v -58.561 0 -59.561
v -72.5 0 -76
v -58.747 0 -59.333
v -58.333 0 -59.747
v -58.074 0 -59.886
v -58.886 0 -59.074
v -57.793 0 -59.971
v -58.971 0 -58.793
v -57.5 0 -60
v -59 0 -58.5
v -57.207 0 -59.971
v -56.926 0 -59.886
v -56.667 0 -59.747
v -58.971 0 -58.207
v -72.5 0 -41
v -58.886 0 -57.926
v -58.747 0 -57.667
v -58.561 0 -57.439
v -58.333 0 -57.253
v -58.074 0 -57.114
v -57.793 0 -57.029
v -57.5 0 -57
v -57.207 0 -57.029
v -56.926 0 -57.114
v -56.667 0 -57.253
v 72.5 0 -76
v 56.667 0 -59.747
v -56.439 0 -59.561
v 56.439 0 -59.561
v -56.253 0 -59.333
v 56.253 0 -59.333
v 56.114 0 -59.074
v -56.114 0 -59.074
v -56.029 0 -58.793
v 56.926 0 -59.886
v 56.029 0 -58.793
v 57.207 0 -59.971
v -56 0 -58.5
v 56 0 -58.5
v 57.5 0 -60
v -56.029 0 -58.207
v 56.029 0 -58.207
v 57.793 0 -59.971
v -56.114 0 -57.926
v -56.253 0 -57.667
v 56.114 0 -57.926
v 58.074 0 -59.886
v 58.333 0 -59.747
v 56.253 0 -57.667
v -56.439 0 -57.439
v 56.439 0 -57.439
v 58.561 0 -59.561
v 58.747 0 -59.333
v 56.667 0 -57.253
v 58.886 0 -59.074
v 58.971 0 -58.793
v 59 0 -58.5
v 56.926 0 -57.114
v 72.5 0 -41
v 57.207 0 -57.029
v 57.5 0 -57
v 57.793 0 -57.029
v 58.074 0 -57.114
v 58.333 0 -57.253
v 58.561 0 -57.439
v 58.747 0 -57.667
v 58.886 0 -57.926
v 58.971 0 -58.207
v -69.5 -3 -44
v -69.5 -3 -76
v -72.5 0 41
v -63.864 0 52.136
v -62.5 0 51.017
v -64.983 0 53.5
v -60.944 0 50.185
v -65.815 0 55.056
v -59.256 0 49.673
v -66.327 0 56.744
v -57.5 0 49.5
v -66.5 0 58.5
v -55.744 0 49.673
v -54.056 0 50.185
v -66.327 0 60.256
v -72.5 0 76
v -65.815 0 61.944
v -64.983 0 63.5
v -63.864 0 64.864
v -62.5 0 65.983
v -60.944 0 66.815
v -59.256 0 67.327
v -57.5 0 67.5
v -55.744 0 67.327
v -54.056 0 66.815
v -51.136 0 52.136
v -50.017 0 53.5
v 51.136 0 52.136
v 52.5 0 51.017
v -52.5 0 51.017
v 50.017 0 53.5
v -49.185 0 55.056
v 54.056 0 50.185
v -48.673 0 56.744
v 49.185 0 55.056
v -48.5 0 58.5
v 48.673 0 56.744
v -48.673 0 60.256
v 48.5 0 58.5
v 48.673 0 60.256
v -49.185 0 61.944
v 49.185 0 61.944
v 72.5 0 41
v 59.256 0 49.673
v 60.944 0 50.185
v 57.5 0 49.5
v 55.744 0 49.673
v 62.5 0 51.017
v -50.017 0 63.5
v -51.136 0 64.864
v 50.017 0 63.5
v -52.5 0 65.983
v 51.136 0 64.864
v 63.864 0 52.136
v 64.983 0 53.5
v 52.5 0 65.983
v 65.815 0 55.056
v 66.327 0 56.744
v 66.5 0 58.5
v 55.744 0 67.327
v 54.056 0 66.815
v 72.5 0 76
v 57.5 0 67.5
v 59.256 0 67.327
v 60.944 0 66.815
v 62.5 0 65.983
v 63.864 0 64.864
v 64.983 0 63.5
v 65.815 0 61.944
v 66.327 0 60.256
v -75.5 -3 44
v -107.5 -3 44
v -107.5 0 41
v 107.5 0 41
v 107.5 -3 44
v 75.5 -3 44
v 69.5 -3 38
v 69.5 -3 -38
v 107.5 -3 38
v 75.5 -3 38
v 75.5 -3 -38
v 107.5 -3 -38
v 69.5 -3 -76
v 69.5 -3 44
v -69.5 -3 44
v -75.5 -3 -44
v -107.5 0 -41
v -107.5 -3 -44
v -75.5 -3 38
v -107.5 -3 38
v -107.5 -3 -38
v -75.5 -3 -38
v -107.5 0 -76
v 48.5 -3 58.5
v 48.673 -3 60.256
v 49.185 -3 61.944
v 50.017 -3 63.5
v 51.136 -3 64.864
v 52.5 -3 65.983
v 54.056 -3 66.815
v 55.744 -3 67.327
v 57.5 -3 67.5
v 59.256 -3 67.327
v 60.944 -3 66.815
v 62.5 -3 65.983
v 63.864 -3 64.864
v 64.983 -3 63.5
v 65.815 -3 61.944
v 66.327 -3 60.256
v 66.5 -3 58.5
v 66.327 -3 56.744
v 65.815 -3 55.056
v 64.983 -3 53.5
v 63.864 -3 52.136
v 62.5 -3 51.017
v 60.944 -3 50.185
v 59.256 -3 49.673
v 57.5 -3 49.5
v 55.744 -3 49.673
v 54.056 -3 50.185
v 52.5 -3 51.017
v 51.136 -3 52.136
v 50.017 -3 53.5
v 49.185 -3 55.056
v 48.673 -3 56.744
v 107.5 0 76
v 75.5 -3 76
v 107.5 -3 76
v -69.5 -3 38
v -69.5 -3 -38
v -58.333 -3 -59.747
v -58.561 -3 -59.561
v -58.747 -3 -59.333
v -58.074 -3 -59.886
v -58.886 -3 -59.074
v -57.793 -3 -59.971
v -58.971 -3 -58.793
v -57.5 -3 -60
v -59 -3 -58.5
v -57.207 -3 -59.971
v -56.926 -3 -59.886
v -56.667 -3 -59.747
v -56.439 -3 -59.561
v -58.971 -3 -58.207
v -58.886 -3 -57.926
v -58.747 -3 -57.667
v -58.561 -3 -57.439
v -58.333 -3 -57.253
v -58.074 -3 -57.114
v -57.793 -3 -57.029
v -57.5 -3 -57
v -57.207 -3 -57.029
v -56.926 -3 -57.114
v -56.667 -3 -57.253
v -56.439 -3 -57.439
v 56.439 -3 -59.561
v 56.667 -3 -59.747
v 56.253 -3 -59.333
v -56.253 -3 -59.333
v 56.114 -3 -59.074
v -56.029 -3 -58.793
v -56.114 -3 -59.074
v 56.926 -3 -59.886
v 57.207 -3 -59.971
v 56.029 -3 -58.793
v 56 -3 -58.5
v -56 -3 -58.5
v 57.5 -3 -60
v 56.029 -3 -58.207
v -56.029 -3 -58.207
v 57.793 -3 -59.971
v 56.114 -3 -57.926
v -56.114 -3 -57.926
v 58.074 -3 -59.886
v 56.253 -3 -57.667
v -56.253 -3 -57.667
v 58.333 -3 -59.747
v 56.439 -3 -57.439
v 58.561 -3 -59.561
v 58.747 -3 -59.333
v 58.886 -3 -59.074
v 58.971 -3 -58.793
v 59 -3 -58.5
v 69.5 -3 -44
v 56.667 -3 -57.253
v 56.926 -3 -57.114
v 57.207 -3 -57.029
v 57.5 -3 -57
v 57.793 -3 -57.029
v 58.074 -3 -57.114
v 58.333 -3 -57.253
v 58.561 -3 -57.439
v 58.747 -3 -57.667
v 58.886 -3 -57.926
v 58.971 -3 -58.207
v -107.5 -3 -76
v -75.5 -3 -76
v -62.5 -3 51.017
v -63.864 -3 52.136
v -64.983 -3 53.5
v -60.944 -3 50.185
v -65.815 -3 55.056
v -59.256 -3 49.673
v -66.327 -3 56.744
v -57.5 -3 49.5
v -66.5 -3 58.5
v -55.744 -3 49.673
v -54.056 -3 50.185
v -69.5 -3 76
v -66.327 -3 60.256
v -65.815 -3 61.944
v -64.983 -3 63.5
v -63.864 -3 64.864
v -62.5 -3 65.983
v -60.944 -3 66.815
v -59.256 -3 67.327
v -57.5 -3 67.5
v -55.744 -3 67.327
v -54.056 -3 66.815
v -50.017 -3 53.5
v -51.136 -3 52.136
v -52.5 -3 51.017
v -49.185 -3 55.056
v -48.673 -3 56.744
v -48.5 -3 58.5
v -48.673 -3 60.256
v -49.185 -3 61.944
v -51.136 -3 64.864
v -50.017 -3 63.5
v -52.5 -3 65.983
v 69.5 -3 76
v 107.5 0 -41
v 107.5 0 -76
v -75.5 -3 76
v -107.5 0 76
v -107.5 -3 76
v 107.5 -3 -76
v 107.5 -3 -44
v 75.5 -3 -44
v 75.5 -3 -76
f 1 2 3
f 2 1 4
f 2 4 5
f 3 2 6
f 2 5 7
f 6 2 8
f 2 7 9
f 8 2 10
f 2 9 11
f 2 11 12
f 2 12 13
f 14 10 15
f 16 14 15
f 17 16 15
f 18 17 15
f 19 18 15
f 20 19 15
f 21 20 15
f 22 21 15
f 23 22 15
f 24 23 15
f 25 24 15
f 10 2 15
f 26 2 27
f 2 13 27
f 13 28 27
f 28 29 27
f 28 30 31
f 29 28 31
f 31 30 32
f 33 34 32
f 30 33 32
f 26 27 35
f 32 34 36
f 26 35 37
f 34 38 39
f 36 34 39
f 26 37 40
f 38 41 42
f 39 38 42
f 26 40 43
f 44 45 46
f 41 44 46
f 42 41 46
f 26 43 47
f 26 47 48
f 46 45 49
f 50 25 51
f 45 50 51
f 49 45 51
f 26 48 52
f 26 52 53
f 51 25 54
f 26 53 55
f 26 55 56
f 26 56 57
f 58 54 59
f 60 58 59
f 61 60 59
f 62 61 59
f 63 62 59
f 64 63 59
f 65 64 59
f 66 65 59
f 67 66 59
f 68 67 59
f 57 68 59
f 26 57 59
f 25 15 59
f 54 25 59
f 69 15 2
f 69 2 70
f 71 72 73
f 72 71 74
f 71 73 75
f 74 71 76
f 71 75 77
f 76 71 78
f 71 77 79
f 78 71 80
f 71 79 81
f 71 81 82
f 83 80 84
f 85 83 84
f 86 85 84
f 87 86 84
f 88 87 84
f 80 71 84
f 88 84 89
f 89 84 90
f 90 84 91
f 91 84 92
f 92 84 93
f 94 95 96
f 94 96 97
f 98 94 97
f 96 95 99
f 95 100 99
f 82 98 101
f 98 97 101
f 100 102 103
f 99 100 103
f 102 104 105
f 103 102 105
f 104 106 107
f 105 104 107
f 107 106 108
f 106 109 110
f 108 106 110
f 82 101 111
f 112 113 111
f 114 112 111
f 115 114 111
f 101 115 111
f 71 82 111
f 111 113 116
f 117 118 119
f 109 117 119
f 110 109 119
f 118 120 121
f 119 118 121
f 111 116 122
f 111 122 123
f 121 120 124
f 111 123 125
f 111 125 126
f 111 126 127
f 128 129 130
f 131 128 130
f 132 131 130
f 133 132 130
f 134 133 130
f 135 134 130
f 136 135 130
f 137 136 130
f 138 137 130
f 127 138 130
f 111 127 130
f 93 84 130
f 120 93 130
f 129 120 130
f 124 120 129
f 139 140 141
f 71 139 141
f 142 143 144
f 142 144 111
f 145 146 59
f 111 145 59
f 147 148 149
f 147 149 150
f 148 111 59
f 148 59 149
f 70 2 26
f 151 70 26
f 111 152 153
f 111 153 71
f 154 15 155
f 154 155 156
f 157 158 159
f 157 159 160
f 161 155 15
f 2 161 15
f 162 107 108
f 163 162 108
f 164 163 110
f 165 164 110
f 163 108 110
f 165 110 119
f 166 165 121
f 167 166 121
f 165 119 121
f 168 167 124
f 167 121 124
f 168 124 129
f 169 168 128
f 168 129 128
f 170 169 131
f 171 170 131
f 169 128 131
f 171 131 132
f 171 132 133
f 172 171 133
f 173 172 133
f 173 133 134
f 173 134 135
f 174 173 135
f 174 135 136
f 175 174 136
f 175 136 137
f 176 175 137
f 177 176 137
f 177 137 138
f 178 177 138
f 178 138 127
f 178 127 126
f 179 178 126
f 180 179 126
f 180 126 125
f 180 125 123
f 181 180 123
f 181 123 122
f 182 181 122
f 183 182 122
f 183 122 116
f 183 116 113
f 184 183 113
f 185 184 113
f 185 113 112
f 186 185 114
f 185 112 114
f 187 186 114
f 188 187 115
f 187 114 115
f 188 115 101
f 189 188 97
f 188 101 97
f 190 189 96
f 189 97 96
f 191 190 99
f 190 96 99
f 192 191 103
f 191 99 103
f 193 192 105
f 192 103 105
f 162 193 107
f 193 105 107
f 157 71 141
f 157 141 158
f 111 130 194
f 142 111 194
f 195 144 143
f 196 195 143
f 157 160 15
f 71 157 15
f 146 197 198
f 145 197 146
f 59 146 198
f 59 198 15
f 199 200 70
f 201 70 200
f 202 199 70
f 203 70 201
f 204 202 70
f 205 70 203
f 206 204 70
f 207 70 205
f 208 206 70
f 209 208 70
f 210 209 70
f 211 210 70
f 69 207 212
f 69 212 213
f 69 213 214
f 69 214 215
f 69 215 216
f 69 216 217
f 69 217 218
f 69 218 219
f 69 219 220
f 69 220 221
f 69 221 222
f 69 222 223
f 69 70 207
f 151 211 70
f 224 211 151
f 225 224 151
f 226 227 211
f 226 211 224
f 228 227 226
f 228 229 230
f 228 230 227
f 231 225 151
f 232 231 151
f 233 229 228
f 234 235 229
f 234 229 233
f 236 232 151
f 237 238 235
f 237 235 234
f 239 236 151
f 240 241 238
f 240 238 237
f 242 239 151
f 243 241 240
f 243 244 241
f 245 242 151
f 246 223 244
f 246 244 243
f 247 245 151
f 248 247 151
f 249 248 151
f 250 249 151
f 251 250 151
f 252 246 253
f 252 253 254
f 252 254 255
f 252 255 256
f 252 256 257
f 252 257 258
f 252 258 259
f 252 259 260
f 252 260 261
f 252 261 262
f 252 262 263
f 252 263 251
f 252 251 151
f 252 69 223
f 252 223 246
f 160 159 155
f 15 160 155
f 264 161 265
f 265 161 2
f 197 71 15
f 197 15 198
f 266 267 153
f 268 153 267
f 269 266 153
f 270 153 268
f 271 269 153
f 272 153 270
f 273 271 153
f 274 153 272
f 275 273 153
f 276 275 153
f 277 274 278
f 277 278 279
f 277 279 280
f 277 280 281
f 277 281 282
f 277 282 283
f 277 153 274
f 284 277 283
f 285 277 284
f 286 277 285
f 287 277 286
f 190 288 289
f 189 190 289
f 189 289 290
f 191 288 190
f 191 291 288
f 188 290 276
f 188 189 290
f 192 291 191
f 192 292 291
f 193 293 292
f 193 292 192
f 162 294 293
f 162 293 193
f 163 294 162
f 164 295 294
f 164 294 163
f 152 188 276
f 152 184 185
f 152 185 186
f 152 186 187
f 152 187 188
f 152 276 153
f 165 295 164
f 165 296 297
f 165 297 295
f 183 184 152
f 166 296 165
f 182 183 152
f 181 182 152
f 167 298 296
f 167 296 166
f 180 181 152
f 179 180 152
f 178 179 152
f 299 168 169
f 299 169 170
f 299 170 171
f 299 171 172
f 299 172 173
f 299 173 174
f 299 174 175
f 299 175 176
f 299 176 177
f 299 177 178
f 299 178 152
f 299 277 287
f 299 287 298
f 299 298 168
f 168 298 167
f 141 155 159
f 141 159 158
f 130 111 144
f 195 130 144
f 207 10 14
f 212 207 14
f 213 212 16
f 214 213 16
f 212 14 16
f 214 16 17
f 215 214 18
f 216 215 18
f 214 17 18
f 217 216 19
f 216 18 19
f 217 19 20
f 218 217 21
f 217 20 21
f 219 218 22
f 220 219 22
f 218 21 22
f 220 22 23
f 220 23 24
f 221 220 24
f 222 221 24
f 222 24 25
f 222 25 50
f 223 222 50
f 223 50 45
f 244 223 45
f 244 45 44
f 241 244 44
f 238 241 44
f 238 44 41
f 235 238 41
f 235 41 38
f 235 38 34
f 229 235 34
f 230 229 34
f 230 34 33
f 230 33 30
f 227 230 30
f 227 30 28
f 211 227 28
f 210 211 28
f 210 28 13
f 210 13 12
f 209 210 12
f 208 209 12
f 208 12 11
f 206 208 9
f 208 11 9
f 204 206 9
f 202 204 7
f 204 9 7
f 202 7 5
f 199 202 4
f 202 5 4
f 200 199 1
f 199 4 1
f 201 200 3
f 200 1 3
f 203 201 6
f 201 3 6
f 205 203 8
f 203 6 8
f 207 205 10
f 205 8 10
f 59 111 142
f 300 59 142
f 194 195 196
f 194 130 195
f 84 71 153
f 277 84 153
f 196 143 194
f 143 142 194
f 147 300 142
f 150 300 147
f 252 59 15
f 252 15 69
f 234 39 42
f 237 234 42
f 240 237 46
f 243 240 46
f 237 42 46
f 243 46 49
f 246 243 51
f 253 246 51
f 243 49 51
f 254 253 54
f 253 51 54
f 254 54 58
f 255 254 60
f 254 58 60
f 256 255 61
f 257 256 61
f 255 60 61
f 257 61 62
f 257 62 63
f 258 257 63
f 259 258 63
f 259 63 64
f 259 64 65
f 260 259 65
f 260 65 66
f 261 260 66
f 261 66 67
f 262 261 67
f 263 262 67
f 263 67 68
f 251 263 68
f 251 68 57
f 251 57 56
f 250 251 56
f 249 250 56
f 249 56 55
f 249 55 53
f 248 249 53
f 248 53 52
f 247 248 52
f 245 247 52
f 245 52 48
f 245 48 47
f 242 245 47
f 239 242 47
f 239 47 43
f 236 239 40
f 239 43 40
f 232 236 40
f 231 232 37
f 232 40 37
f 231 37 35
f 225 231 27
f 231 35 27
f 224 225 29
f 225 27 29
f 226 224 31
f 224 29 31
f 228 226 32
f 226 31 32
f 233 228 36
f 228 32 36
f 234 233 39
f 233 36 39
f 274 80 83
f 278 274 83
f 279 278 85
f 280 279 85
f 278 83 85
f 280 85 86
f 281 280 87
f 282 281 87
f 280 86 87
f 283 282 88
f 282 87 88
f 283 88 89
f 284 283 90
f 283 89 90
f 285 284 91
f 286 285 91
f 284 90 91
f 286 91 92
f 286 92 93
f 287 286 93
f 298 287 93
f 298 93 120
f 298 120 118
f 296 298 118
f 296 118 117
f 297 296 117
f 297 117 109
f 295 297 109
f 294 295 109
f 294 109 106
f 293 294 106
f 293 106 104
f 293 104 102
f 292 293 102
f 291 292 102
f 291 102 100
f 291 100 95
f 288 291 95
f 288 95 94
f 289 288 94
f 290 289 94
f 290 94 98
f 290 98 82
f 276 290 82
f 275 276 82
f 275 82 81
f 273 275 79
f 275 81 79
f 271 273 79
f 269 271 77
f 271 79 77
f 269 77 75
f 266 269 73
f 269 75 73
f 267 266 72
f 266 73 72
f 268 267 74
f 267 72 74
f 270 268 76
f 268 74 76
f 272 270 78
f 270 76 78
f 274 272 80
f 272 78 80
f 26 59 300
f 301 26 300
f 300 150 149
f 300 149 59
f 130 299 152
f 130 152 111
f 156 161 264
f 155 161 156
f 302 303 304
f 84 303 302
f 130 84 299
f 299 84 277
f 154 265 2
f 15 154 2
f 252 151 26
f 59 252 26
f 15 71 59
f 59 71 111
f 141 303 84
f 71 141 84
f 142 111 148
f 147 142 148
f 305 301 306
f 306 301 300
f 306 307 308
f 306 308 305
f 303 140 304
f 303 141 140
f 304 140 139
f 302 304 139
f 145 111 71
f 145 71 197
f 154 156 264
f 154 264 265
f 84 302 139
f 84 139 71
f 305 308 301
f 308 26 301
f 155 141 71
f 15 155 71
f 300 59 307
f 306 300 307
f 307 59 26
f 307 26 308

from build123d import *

# Parameters (mm, degrees)
F0_W     = 215
F0_H     = 152
F1_DEPTH = 3
F3_DEPTH = 174.7
F5_DEPTH = 226.7
F6_R     = 9
F6_R_2   = 1.5
F7_DEPTH = 25


with BuildPart() as f1:
    # F0 (on Front) → F1 (new body)
    with BuildSketch(Plane.XZ):
        Rectangle(F0_W, F0_H)
    extrude(amount=F1_DEPTH)

    # F2 (on face) → F3 (cut)
    with BuildSketch(Plane(origin=(0, 0, -76), x_dir=(1, 0, 0), z_dir=(0, 0, -1))):
        Polygon((-75.5, 3), (-72.5, 0), (-69.5, 3), align=None)
        Polygon((69.5, 3), (72.5, 0), (75.5, 3), align=None)
    extrude(amount=-F3_DEPTH, mode=Mode.SUBTRACT)

    # F4 (on face) → F5 (cut)
    with BuildSketch(Plane(origin=(-107.5, 0, 0), x_dir=(0, -1, 0), z_dir=(-1, 0, 0))):
        Polygon((3, 44), (0, 41), (3, 38), align=None)
        Polygon((3, -38), (0, -41), (3, -44), align=None)
    extrude(amount=-F5_DEPTH, mode=Mode.SUBTRACT)

    # F6 (on face) → F7 (cut)
    with BuildSketch(Plane(origin=(0, 0, 0), x_dir=(-1, 0, 0), z_dir=(0, 1, 0))):
        with Locations((-57.5, 58.5)):
            Circle(F6_R)
        with Locations((57.5, 58.5)):
            Circle(F6_R)
        with Locations((-57.5, -58.5)):
            Circle(F6_R_2)
        with Locations((57.5, -58.5)):
            Circle(F6_R_2)
    extrude(amount=-F7_DEPTH, mode=Mode.SUBTRACT)


solid = f1.part
